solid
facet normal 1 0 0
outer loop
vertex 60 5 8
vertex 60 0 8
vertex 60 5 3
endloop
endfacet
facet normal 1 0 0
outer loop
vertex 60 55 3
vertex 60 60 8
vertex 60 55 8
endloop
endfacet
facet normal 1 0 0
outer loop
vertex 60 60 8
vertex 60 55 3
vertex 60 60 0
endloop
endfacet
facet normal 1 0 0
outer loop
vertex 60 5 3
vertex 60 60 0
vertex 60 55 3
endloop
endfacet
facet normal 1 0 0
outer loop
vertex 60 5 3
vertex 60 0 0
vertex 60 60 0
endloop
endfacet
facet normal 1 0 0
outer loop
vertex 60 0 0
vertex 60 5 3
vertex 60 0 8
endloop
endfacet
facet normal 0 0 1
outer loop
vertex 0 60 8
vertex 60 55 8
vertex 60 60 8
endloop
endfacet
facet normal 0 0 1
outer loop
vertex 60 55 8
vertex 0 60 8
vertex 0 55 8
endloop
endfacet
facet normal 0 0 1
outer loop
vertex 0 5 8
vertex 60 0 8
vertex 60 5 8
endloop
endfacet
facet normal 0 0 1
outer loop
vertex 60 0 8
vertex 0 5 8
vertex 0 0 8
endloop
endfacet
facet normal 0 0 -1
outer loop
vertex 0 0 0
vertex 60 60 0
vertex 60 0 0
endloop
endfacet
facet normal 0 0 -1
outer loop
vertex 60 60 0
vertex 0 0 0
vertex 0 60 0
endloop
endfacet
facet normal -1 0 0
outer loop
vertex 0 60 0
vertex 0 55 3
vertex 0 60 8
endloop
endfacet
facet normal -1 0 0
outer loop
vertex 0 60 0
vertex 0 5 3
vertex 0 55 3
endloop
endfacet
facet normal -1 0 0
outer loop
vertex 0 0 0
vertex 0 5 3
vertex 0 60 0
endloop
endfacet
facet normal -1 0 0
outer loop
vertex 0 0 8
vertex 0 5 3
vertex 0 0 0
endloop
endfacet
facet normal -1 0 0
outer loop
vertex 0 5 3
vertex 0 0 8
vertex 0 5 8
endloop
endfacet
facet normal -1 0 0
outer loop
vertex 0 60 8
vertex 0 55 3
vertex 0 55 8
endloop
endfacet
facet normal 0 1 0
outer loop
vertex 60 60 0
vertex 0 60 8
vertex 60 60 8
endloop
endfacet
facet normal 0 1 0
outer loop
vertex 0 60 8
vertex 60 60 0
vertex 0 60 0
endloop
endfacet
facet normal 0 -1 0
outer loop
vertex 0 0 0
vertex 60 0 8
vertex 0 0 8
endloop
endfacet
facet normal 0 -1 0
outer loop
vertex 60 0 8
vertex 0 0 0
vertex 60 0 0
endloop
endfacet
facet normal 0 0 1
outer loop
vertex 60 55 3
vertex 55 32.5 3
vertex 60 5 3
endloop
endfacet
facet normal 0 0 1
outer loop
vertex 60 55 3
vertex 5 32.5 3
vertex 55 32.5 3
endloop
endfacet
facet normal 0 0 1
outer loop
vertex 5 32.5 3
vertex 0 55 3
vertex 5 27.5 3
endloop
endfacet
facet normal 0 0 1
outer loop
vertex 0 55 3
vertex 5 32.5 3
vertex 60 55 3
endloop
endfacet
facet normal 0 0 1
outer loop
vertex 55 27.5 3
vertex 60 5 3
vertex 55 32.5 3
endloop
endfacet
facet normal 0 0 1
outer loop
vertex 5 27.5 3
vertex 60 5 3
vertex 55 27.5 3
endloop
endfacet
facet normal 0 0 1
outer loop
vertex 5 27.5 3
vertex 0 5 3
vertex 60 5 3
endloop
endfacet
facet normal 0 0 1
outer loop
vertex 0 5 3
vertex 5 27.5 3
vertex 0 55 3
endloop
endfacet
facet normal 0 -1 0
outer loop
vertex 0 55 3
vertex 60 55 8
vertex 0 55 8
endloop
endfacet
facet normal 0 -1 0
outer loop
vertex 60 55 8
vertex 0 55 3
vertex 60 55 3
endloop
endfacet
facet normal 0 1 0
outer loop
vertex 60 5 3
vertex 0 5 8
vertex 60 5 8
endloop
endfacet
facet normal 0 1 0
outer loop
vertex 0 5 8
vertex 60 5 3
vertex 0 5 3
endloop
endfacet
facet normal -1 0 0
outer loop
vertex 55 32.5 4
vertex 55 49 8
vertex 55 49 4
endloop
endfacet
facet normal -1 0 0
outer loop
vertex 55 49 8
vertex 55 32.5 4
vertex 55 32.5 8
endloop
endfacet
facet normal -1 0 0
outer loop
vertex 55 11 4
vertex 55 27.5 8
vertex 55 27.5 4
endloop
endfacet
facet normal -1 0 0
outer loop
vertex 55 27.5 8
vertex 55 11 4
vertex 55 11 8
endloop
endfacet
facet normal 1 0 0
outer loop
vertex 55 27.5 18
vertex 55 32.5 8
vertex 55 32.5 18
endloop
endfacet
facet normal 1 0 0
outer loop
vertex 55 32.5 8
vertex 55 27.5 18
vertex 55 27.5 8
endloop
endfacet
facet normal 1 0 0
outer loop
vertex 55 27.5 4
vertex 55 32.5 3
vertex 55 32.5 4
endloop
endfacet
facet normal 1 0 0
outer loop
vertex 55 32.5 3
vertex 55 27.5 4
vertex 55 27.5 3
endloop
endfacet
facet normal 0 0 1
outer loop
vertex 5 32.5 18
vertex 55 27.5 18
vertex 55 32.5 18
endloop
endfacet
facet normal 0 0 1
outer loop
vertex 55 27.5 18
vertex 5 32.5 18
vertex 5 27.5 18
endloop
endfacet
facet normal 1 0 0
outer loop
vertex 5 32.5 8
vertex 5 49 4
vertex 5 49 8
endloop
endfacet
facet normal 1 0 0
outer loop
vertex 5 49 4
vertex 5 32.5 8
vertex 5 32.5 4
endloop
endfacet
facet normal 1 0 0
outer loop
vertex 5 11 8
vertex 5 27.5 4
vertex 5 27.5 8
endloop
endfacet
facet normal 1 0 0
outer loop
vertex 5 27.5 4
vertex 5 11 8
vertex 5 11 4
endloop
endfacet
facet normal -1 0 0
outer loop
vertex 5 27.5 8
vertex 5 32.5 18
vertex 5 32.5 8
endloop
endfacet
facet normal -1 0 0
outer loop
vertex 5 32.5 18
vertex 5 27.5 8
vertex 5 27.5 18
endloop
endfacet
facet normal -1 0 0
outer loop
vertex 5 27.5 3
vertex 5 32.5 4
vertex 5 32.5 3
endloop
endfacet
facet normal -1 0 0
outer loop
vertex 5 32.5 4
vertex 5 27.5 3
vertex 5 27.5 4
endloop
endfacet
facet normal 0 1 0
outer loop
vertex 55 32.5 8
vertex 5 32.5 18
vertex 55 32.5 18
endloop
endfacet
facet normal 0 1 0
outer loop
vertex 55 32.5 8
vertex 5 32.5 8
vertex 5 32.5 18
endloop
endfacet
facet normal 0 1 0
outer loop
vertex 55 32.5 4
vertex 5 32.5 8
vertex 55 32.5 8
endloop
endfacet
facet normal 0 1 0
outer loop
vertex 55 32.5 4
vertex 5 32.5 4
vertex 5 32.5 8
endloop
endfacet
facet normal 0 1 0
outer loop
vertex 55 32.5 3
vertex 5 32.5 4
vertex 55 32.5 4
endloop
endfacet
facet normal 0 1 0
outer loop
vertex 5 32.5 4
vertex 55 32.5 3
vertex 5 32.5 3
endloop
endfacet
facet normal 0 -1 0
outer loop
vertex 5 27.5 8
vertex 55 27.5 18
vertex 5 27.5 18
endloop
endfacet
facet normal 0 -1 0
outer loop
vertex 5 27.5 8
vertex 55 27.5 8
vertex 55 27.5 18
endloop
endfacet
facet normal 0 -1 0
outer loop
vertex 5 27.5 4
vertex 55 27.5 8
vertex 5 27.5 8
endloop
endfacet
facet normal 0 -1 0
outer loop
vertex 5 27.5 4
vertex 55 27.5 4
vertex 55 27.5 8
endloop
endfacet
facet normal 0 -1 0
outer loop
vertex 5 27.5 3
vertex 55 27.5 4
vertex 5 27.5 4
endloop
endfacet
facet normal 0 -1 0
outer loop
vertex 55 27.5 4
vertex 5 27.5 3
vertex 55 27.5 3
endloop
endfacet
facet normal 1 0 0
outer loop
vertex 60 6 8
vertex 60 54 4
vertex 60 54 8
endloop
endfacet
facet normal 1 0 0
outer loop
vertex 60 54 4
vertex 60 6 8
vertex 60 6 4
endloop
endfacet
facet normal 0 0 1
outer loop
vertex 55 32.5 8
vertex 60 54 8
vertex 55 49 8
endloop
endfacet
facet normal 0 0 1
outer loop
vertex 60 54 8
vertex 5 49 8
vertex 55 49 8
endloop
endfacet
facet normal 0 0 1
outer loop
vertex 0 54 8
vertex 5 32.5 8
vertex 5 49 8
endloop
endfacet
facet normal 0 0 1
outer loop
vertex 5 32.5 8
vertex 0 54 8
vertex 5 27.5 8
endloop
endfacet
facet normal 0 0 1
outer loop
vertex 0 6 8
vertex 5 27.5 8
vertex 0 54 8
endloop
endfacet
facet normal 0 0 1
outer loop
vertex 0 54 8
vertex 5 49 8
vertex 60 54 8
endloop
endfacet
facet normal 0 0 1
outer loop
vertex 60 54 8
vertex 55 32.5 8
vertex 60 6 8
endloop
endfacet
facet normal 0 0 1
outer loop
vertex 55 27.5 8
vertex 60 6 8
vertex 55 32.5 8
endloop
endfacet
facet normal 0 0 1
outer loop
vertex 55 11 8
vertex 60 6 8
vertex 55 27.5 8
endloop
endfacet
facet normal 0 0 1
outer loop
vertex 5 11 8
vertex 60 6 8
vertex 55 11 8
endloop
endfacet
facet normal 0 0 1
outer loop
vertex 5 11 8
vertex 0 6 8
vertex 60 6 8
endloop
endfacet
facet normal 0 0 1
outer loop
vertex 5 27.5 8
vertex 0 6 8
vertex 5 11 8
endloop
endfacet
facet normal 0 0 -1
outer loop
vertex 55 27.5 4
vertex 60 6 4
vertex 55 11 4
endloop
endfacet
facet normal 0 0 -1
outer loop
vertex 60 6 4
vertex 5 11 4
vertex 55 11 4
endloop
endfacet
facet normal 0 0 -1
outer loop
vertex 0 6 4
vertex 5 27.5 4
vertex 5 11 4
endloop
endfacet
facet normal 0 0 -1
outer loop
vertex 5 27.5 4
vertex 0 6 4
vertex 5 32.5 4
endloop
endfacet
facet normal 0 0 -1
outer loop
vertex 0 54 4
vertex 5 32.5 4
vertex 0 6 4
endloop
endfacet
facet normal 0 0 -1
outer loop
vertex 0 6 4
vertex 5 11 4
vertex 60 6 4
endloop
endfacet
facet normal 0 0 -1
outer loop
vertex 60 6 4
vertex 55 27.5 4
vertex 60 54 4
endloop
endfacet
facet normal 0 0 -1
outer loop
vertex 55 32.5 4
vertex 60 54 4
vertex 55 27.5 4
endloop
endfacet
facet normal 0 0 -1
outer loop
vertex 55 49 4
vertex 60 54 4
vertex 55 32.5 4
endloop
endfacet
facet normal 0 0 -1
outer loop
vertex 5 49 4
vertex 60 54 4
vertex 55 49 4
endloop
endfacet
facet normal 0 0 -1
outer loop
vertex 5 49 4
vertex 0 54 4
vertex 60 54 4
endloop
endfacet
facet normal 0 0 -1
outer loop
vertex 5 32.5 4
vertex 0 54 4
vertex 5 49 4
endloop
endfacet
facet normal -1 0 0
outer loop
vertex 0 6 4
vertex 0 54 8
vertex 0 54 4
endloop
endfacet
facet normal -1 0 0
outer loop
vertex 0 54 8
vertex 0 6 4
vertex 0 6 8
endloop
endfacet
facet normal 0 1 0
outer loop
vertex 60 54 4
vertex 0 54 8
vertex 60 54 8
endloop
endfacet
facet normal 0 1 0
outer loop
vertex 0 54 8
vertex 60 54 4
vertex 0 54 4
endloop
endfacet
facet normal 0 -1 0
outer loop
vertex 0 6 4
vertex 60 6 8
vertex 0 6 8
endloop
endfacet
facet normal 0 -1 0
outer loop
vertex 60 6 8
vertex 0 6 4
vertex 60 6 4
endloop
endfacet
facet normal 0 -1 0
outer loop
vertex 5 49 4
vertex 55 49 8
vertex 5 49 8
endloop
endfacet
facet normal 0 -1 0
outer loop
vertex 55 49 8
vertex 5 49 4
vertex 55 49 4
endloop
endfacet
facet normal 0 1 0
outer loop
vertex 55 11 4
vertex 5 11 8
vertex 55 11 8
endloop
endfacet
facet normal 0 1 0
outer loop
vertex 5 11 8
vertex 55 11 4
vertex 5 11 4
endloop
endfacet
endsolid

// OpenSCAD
// preview[view:south west, tilt:top diagonal]

/* [Base] */
// Width of the grinding surface
width = 60;
// Length of the grinding surface
length = 60;
// Height of the grinding surface
height = 3;

/* [Bracket] */
// The height of the bracket
bracketHeight = 5;
// Wall thickness of the bracket
bracketWall = 5;
// The padding between base and bracket has to fit the sandpaper and account for shrinking
padding = 1;

/* [Handle] */
// Height of the handle
handleHeight = 15;
// Width of the handle
handleWidth = 5;

/* [View] */
// Which parts would you like to see?
part = "all"; // [all:Base and Bracket, base:Base Only, bracket:Bracket Only]

/* [Hidden] */
backen = 5;
bracketWidth = width;
bracketLength = length - backen * 2 - padding * 2;

print_part();

module print_part() {
	if(part == "base")
		printBase();
	else if(part == "bracket")
		printBracket();
	else
		printBoth();
}

module printBoth() {
	basePlate();

	translate([0, padding + backen, height + padding])
		bracket();
}

module printBase() {
	basePlate();
}

module printBracket() {
	bracket();
}

module basePlate() {
	handleLength = width - backen * 2;

	difference() {
		cube([width, length, height + bracketHeight]);
		
		translate([-1, backen, height])
			cube([width + 2, length - backen * 2, bracketHeight + 1]);
	}
	
	/* Handle */
	translate([backen, (length / 2) - (handleWidth / 2), height])
		cube([handleLength, handleWidth, handleHeight]);
}

module bracket() {
	innerWidth = bracketWidth - bracketWall * 2;
	innerLength = bracketLength - bracketWall * 2;
	bracketHeight = bracketHeight - padding;

	difference() {
		cube([bracketWidth, bracketLength, bracketHeight]);

		translate([bracketWall, bracketWall, -1])
			cube([innerWidth, innerLength, bracketHeight + 2]);
	}
}
